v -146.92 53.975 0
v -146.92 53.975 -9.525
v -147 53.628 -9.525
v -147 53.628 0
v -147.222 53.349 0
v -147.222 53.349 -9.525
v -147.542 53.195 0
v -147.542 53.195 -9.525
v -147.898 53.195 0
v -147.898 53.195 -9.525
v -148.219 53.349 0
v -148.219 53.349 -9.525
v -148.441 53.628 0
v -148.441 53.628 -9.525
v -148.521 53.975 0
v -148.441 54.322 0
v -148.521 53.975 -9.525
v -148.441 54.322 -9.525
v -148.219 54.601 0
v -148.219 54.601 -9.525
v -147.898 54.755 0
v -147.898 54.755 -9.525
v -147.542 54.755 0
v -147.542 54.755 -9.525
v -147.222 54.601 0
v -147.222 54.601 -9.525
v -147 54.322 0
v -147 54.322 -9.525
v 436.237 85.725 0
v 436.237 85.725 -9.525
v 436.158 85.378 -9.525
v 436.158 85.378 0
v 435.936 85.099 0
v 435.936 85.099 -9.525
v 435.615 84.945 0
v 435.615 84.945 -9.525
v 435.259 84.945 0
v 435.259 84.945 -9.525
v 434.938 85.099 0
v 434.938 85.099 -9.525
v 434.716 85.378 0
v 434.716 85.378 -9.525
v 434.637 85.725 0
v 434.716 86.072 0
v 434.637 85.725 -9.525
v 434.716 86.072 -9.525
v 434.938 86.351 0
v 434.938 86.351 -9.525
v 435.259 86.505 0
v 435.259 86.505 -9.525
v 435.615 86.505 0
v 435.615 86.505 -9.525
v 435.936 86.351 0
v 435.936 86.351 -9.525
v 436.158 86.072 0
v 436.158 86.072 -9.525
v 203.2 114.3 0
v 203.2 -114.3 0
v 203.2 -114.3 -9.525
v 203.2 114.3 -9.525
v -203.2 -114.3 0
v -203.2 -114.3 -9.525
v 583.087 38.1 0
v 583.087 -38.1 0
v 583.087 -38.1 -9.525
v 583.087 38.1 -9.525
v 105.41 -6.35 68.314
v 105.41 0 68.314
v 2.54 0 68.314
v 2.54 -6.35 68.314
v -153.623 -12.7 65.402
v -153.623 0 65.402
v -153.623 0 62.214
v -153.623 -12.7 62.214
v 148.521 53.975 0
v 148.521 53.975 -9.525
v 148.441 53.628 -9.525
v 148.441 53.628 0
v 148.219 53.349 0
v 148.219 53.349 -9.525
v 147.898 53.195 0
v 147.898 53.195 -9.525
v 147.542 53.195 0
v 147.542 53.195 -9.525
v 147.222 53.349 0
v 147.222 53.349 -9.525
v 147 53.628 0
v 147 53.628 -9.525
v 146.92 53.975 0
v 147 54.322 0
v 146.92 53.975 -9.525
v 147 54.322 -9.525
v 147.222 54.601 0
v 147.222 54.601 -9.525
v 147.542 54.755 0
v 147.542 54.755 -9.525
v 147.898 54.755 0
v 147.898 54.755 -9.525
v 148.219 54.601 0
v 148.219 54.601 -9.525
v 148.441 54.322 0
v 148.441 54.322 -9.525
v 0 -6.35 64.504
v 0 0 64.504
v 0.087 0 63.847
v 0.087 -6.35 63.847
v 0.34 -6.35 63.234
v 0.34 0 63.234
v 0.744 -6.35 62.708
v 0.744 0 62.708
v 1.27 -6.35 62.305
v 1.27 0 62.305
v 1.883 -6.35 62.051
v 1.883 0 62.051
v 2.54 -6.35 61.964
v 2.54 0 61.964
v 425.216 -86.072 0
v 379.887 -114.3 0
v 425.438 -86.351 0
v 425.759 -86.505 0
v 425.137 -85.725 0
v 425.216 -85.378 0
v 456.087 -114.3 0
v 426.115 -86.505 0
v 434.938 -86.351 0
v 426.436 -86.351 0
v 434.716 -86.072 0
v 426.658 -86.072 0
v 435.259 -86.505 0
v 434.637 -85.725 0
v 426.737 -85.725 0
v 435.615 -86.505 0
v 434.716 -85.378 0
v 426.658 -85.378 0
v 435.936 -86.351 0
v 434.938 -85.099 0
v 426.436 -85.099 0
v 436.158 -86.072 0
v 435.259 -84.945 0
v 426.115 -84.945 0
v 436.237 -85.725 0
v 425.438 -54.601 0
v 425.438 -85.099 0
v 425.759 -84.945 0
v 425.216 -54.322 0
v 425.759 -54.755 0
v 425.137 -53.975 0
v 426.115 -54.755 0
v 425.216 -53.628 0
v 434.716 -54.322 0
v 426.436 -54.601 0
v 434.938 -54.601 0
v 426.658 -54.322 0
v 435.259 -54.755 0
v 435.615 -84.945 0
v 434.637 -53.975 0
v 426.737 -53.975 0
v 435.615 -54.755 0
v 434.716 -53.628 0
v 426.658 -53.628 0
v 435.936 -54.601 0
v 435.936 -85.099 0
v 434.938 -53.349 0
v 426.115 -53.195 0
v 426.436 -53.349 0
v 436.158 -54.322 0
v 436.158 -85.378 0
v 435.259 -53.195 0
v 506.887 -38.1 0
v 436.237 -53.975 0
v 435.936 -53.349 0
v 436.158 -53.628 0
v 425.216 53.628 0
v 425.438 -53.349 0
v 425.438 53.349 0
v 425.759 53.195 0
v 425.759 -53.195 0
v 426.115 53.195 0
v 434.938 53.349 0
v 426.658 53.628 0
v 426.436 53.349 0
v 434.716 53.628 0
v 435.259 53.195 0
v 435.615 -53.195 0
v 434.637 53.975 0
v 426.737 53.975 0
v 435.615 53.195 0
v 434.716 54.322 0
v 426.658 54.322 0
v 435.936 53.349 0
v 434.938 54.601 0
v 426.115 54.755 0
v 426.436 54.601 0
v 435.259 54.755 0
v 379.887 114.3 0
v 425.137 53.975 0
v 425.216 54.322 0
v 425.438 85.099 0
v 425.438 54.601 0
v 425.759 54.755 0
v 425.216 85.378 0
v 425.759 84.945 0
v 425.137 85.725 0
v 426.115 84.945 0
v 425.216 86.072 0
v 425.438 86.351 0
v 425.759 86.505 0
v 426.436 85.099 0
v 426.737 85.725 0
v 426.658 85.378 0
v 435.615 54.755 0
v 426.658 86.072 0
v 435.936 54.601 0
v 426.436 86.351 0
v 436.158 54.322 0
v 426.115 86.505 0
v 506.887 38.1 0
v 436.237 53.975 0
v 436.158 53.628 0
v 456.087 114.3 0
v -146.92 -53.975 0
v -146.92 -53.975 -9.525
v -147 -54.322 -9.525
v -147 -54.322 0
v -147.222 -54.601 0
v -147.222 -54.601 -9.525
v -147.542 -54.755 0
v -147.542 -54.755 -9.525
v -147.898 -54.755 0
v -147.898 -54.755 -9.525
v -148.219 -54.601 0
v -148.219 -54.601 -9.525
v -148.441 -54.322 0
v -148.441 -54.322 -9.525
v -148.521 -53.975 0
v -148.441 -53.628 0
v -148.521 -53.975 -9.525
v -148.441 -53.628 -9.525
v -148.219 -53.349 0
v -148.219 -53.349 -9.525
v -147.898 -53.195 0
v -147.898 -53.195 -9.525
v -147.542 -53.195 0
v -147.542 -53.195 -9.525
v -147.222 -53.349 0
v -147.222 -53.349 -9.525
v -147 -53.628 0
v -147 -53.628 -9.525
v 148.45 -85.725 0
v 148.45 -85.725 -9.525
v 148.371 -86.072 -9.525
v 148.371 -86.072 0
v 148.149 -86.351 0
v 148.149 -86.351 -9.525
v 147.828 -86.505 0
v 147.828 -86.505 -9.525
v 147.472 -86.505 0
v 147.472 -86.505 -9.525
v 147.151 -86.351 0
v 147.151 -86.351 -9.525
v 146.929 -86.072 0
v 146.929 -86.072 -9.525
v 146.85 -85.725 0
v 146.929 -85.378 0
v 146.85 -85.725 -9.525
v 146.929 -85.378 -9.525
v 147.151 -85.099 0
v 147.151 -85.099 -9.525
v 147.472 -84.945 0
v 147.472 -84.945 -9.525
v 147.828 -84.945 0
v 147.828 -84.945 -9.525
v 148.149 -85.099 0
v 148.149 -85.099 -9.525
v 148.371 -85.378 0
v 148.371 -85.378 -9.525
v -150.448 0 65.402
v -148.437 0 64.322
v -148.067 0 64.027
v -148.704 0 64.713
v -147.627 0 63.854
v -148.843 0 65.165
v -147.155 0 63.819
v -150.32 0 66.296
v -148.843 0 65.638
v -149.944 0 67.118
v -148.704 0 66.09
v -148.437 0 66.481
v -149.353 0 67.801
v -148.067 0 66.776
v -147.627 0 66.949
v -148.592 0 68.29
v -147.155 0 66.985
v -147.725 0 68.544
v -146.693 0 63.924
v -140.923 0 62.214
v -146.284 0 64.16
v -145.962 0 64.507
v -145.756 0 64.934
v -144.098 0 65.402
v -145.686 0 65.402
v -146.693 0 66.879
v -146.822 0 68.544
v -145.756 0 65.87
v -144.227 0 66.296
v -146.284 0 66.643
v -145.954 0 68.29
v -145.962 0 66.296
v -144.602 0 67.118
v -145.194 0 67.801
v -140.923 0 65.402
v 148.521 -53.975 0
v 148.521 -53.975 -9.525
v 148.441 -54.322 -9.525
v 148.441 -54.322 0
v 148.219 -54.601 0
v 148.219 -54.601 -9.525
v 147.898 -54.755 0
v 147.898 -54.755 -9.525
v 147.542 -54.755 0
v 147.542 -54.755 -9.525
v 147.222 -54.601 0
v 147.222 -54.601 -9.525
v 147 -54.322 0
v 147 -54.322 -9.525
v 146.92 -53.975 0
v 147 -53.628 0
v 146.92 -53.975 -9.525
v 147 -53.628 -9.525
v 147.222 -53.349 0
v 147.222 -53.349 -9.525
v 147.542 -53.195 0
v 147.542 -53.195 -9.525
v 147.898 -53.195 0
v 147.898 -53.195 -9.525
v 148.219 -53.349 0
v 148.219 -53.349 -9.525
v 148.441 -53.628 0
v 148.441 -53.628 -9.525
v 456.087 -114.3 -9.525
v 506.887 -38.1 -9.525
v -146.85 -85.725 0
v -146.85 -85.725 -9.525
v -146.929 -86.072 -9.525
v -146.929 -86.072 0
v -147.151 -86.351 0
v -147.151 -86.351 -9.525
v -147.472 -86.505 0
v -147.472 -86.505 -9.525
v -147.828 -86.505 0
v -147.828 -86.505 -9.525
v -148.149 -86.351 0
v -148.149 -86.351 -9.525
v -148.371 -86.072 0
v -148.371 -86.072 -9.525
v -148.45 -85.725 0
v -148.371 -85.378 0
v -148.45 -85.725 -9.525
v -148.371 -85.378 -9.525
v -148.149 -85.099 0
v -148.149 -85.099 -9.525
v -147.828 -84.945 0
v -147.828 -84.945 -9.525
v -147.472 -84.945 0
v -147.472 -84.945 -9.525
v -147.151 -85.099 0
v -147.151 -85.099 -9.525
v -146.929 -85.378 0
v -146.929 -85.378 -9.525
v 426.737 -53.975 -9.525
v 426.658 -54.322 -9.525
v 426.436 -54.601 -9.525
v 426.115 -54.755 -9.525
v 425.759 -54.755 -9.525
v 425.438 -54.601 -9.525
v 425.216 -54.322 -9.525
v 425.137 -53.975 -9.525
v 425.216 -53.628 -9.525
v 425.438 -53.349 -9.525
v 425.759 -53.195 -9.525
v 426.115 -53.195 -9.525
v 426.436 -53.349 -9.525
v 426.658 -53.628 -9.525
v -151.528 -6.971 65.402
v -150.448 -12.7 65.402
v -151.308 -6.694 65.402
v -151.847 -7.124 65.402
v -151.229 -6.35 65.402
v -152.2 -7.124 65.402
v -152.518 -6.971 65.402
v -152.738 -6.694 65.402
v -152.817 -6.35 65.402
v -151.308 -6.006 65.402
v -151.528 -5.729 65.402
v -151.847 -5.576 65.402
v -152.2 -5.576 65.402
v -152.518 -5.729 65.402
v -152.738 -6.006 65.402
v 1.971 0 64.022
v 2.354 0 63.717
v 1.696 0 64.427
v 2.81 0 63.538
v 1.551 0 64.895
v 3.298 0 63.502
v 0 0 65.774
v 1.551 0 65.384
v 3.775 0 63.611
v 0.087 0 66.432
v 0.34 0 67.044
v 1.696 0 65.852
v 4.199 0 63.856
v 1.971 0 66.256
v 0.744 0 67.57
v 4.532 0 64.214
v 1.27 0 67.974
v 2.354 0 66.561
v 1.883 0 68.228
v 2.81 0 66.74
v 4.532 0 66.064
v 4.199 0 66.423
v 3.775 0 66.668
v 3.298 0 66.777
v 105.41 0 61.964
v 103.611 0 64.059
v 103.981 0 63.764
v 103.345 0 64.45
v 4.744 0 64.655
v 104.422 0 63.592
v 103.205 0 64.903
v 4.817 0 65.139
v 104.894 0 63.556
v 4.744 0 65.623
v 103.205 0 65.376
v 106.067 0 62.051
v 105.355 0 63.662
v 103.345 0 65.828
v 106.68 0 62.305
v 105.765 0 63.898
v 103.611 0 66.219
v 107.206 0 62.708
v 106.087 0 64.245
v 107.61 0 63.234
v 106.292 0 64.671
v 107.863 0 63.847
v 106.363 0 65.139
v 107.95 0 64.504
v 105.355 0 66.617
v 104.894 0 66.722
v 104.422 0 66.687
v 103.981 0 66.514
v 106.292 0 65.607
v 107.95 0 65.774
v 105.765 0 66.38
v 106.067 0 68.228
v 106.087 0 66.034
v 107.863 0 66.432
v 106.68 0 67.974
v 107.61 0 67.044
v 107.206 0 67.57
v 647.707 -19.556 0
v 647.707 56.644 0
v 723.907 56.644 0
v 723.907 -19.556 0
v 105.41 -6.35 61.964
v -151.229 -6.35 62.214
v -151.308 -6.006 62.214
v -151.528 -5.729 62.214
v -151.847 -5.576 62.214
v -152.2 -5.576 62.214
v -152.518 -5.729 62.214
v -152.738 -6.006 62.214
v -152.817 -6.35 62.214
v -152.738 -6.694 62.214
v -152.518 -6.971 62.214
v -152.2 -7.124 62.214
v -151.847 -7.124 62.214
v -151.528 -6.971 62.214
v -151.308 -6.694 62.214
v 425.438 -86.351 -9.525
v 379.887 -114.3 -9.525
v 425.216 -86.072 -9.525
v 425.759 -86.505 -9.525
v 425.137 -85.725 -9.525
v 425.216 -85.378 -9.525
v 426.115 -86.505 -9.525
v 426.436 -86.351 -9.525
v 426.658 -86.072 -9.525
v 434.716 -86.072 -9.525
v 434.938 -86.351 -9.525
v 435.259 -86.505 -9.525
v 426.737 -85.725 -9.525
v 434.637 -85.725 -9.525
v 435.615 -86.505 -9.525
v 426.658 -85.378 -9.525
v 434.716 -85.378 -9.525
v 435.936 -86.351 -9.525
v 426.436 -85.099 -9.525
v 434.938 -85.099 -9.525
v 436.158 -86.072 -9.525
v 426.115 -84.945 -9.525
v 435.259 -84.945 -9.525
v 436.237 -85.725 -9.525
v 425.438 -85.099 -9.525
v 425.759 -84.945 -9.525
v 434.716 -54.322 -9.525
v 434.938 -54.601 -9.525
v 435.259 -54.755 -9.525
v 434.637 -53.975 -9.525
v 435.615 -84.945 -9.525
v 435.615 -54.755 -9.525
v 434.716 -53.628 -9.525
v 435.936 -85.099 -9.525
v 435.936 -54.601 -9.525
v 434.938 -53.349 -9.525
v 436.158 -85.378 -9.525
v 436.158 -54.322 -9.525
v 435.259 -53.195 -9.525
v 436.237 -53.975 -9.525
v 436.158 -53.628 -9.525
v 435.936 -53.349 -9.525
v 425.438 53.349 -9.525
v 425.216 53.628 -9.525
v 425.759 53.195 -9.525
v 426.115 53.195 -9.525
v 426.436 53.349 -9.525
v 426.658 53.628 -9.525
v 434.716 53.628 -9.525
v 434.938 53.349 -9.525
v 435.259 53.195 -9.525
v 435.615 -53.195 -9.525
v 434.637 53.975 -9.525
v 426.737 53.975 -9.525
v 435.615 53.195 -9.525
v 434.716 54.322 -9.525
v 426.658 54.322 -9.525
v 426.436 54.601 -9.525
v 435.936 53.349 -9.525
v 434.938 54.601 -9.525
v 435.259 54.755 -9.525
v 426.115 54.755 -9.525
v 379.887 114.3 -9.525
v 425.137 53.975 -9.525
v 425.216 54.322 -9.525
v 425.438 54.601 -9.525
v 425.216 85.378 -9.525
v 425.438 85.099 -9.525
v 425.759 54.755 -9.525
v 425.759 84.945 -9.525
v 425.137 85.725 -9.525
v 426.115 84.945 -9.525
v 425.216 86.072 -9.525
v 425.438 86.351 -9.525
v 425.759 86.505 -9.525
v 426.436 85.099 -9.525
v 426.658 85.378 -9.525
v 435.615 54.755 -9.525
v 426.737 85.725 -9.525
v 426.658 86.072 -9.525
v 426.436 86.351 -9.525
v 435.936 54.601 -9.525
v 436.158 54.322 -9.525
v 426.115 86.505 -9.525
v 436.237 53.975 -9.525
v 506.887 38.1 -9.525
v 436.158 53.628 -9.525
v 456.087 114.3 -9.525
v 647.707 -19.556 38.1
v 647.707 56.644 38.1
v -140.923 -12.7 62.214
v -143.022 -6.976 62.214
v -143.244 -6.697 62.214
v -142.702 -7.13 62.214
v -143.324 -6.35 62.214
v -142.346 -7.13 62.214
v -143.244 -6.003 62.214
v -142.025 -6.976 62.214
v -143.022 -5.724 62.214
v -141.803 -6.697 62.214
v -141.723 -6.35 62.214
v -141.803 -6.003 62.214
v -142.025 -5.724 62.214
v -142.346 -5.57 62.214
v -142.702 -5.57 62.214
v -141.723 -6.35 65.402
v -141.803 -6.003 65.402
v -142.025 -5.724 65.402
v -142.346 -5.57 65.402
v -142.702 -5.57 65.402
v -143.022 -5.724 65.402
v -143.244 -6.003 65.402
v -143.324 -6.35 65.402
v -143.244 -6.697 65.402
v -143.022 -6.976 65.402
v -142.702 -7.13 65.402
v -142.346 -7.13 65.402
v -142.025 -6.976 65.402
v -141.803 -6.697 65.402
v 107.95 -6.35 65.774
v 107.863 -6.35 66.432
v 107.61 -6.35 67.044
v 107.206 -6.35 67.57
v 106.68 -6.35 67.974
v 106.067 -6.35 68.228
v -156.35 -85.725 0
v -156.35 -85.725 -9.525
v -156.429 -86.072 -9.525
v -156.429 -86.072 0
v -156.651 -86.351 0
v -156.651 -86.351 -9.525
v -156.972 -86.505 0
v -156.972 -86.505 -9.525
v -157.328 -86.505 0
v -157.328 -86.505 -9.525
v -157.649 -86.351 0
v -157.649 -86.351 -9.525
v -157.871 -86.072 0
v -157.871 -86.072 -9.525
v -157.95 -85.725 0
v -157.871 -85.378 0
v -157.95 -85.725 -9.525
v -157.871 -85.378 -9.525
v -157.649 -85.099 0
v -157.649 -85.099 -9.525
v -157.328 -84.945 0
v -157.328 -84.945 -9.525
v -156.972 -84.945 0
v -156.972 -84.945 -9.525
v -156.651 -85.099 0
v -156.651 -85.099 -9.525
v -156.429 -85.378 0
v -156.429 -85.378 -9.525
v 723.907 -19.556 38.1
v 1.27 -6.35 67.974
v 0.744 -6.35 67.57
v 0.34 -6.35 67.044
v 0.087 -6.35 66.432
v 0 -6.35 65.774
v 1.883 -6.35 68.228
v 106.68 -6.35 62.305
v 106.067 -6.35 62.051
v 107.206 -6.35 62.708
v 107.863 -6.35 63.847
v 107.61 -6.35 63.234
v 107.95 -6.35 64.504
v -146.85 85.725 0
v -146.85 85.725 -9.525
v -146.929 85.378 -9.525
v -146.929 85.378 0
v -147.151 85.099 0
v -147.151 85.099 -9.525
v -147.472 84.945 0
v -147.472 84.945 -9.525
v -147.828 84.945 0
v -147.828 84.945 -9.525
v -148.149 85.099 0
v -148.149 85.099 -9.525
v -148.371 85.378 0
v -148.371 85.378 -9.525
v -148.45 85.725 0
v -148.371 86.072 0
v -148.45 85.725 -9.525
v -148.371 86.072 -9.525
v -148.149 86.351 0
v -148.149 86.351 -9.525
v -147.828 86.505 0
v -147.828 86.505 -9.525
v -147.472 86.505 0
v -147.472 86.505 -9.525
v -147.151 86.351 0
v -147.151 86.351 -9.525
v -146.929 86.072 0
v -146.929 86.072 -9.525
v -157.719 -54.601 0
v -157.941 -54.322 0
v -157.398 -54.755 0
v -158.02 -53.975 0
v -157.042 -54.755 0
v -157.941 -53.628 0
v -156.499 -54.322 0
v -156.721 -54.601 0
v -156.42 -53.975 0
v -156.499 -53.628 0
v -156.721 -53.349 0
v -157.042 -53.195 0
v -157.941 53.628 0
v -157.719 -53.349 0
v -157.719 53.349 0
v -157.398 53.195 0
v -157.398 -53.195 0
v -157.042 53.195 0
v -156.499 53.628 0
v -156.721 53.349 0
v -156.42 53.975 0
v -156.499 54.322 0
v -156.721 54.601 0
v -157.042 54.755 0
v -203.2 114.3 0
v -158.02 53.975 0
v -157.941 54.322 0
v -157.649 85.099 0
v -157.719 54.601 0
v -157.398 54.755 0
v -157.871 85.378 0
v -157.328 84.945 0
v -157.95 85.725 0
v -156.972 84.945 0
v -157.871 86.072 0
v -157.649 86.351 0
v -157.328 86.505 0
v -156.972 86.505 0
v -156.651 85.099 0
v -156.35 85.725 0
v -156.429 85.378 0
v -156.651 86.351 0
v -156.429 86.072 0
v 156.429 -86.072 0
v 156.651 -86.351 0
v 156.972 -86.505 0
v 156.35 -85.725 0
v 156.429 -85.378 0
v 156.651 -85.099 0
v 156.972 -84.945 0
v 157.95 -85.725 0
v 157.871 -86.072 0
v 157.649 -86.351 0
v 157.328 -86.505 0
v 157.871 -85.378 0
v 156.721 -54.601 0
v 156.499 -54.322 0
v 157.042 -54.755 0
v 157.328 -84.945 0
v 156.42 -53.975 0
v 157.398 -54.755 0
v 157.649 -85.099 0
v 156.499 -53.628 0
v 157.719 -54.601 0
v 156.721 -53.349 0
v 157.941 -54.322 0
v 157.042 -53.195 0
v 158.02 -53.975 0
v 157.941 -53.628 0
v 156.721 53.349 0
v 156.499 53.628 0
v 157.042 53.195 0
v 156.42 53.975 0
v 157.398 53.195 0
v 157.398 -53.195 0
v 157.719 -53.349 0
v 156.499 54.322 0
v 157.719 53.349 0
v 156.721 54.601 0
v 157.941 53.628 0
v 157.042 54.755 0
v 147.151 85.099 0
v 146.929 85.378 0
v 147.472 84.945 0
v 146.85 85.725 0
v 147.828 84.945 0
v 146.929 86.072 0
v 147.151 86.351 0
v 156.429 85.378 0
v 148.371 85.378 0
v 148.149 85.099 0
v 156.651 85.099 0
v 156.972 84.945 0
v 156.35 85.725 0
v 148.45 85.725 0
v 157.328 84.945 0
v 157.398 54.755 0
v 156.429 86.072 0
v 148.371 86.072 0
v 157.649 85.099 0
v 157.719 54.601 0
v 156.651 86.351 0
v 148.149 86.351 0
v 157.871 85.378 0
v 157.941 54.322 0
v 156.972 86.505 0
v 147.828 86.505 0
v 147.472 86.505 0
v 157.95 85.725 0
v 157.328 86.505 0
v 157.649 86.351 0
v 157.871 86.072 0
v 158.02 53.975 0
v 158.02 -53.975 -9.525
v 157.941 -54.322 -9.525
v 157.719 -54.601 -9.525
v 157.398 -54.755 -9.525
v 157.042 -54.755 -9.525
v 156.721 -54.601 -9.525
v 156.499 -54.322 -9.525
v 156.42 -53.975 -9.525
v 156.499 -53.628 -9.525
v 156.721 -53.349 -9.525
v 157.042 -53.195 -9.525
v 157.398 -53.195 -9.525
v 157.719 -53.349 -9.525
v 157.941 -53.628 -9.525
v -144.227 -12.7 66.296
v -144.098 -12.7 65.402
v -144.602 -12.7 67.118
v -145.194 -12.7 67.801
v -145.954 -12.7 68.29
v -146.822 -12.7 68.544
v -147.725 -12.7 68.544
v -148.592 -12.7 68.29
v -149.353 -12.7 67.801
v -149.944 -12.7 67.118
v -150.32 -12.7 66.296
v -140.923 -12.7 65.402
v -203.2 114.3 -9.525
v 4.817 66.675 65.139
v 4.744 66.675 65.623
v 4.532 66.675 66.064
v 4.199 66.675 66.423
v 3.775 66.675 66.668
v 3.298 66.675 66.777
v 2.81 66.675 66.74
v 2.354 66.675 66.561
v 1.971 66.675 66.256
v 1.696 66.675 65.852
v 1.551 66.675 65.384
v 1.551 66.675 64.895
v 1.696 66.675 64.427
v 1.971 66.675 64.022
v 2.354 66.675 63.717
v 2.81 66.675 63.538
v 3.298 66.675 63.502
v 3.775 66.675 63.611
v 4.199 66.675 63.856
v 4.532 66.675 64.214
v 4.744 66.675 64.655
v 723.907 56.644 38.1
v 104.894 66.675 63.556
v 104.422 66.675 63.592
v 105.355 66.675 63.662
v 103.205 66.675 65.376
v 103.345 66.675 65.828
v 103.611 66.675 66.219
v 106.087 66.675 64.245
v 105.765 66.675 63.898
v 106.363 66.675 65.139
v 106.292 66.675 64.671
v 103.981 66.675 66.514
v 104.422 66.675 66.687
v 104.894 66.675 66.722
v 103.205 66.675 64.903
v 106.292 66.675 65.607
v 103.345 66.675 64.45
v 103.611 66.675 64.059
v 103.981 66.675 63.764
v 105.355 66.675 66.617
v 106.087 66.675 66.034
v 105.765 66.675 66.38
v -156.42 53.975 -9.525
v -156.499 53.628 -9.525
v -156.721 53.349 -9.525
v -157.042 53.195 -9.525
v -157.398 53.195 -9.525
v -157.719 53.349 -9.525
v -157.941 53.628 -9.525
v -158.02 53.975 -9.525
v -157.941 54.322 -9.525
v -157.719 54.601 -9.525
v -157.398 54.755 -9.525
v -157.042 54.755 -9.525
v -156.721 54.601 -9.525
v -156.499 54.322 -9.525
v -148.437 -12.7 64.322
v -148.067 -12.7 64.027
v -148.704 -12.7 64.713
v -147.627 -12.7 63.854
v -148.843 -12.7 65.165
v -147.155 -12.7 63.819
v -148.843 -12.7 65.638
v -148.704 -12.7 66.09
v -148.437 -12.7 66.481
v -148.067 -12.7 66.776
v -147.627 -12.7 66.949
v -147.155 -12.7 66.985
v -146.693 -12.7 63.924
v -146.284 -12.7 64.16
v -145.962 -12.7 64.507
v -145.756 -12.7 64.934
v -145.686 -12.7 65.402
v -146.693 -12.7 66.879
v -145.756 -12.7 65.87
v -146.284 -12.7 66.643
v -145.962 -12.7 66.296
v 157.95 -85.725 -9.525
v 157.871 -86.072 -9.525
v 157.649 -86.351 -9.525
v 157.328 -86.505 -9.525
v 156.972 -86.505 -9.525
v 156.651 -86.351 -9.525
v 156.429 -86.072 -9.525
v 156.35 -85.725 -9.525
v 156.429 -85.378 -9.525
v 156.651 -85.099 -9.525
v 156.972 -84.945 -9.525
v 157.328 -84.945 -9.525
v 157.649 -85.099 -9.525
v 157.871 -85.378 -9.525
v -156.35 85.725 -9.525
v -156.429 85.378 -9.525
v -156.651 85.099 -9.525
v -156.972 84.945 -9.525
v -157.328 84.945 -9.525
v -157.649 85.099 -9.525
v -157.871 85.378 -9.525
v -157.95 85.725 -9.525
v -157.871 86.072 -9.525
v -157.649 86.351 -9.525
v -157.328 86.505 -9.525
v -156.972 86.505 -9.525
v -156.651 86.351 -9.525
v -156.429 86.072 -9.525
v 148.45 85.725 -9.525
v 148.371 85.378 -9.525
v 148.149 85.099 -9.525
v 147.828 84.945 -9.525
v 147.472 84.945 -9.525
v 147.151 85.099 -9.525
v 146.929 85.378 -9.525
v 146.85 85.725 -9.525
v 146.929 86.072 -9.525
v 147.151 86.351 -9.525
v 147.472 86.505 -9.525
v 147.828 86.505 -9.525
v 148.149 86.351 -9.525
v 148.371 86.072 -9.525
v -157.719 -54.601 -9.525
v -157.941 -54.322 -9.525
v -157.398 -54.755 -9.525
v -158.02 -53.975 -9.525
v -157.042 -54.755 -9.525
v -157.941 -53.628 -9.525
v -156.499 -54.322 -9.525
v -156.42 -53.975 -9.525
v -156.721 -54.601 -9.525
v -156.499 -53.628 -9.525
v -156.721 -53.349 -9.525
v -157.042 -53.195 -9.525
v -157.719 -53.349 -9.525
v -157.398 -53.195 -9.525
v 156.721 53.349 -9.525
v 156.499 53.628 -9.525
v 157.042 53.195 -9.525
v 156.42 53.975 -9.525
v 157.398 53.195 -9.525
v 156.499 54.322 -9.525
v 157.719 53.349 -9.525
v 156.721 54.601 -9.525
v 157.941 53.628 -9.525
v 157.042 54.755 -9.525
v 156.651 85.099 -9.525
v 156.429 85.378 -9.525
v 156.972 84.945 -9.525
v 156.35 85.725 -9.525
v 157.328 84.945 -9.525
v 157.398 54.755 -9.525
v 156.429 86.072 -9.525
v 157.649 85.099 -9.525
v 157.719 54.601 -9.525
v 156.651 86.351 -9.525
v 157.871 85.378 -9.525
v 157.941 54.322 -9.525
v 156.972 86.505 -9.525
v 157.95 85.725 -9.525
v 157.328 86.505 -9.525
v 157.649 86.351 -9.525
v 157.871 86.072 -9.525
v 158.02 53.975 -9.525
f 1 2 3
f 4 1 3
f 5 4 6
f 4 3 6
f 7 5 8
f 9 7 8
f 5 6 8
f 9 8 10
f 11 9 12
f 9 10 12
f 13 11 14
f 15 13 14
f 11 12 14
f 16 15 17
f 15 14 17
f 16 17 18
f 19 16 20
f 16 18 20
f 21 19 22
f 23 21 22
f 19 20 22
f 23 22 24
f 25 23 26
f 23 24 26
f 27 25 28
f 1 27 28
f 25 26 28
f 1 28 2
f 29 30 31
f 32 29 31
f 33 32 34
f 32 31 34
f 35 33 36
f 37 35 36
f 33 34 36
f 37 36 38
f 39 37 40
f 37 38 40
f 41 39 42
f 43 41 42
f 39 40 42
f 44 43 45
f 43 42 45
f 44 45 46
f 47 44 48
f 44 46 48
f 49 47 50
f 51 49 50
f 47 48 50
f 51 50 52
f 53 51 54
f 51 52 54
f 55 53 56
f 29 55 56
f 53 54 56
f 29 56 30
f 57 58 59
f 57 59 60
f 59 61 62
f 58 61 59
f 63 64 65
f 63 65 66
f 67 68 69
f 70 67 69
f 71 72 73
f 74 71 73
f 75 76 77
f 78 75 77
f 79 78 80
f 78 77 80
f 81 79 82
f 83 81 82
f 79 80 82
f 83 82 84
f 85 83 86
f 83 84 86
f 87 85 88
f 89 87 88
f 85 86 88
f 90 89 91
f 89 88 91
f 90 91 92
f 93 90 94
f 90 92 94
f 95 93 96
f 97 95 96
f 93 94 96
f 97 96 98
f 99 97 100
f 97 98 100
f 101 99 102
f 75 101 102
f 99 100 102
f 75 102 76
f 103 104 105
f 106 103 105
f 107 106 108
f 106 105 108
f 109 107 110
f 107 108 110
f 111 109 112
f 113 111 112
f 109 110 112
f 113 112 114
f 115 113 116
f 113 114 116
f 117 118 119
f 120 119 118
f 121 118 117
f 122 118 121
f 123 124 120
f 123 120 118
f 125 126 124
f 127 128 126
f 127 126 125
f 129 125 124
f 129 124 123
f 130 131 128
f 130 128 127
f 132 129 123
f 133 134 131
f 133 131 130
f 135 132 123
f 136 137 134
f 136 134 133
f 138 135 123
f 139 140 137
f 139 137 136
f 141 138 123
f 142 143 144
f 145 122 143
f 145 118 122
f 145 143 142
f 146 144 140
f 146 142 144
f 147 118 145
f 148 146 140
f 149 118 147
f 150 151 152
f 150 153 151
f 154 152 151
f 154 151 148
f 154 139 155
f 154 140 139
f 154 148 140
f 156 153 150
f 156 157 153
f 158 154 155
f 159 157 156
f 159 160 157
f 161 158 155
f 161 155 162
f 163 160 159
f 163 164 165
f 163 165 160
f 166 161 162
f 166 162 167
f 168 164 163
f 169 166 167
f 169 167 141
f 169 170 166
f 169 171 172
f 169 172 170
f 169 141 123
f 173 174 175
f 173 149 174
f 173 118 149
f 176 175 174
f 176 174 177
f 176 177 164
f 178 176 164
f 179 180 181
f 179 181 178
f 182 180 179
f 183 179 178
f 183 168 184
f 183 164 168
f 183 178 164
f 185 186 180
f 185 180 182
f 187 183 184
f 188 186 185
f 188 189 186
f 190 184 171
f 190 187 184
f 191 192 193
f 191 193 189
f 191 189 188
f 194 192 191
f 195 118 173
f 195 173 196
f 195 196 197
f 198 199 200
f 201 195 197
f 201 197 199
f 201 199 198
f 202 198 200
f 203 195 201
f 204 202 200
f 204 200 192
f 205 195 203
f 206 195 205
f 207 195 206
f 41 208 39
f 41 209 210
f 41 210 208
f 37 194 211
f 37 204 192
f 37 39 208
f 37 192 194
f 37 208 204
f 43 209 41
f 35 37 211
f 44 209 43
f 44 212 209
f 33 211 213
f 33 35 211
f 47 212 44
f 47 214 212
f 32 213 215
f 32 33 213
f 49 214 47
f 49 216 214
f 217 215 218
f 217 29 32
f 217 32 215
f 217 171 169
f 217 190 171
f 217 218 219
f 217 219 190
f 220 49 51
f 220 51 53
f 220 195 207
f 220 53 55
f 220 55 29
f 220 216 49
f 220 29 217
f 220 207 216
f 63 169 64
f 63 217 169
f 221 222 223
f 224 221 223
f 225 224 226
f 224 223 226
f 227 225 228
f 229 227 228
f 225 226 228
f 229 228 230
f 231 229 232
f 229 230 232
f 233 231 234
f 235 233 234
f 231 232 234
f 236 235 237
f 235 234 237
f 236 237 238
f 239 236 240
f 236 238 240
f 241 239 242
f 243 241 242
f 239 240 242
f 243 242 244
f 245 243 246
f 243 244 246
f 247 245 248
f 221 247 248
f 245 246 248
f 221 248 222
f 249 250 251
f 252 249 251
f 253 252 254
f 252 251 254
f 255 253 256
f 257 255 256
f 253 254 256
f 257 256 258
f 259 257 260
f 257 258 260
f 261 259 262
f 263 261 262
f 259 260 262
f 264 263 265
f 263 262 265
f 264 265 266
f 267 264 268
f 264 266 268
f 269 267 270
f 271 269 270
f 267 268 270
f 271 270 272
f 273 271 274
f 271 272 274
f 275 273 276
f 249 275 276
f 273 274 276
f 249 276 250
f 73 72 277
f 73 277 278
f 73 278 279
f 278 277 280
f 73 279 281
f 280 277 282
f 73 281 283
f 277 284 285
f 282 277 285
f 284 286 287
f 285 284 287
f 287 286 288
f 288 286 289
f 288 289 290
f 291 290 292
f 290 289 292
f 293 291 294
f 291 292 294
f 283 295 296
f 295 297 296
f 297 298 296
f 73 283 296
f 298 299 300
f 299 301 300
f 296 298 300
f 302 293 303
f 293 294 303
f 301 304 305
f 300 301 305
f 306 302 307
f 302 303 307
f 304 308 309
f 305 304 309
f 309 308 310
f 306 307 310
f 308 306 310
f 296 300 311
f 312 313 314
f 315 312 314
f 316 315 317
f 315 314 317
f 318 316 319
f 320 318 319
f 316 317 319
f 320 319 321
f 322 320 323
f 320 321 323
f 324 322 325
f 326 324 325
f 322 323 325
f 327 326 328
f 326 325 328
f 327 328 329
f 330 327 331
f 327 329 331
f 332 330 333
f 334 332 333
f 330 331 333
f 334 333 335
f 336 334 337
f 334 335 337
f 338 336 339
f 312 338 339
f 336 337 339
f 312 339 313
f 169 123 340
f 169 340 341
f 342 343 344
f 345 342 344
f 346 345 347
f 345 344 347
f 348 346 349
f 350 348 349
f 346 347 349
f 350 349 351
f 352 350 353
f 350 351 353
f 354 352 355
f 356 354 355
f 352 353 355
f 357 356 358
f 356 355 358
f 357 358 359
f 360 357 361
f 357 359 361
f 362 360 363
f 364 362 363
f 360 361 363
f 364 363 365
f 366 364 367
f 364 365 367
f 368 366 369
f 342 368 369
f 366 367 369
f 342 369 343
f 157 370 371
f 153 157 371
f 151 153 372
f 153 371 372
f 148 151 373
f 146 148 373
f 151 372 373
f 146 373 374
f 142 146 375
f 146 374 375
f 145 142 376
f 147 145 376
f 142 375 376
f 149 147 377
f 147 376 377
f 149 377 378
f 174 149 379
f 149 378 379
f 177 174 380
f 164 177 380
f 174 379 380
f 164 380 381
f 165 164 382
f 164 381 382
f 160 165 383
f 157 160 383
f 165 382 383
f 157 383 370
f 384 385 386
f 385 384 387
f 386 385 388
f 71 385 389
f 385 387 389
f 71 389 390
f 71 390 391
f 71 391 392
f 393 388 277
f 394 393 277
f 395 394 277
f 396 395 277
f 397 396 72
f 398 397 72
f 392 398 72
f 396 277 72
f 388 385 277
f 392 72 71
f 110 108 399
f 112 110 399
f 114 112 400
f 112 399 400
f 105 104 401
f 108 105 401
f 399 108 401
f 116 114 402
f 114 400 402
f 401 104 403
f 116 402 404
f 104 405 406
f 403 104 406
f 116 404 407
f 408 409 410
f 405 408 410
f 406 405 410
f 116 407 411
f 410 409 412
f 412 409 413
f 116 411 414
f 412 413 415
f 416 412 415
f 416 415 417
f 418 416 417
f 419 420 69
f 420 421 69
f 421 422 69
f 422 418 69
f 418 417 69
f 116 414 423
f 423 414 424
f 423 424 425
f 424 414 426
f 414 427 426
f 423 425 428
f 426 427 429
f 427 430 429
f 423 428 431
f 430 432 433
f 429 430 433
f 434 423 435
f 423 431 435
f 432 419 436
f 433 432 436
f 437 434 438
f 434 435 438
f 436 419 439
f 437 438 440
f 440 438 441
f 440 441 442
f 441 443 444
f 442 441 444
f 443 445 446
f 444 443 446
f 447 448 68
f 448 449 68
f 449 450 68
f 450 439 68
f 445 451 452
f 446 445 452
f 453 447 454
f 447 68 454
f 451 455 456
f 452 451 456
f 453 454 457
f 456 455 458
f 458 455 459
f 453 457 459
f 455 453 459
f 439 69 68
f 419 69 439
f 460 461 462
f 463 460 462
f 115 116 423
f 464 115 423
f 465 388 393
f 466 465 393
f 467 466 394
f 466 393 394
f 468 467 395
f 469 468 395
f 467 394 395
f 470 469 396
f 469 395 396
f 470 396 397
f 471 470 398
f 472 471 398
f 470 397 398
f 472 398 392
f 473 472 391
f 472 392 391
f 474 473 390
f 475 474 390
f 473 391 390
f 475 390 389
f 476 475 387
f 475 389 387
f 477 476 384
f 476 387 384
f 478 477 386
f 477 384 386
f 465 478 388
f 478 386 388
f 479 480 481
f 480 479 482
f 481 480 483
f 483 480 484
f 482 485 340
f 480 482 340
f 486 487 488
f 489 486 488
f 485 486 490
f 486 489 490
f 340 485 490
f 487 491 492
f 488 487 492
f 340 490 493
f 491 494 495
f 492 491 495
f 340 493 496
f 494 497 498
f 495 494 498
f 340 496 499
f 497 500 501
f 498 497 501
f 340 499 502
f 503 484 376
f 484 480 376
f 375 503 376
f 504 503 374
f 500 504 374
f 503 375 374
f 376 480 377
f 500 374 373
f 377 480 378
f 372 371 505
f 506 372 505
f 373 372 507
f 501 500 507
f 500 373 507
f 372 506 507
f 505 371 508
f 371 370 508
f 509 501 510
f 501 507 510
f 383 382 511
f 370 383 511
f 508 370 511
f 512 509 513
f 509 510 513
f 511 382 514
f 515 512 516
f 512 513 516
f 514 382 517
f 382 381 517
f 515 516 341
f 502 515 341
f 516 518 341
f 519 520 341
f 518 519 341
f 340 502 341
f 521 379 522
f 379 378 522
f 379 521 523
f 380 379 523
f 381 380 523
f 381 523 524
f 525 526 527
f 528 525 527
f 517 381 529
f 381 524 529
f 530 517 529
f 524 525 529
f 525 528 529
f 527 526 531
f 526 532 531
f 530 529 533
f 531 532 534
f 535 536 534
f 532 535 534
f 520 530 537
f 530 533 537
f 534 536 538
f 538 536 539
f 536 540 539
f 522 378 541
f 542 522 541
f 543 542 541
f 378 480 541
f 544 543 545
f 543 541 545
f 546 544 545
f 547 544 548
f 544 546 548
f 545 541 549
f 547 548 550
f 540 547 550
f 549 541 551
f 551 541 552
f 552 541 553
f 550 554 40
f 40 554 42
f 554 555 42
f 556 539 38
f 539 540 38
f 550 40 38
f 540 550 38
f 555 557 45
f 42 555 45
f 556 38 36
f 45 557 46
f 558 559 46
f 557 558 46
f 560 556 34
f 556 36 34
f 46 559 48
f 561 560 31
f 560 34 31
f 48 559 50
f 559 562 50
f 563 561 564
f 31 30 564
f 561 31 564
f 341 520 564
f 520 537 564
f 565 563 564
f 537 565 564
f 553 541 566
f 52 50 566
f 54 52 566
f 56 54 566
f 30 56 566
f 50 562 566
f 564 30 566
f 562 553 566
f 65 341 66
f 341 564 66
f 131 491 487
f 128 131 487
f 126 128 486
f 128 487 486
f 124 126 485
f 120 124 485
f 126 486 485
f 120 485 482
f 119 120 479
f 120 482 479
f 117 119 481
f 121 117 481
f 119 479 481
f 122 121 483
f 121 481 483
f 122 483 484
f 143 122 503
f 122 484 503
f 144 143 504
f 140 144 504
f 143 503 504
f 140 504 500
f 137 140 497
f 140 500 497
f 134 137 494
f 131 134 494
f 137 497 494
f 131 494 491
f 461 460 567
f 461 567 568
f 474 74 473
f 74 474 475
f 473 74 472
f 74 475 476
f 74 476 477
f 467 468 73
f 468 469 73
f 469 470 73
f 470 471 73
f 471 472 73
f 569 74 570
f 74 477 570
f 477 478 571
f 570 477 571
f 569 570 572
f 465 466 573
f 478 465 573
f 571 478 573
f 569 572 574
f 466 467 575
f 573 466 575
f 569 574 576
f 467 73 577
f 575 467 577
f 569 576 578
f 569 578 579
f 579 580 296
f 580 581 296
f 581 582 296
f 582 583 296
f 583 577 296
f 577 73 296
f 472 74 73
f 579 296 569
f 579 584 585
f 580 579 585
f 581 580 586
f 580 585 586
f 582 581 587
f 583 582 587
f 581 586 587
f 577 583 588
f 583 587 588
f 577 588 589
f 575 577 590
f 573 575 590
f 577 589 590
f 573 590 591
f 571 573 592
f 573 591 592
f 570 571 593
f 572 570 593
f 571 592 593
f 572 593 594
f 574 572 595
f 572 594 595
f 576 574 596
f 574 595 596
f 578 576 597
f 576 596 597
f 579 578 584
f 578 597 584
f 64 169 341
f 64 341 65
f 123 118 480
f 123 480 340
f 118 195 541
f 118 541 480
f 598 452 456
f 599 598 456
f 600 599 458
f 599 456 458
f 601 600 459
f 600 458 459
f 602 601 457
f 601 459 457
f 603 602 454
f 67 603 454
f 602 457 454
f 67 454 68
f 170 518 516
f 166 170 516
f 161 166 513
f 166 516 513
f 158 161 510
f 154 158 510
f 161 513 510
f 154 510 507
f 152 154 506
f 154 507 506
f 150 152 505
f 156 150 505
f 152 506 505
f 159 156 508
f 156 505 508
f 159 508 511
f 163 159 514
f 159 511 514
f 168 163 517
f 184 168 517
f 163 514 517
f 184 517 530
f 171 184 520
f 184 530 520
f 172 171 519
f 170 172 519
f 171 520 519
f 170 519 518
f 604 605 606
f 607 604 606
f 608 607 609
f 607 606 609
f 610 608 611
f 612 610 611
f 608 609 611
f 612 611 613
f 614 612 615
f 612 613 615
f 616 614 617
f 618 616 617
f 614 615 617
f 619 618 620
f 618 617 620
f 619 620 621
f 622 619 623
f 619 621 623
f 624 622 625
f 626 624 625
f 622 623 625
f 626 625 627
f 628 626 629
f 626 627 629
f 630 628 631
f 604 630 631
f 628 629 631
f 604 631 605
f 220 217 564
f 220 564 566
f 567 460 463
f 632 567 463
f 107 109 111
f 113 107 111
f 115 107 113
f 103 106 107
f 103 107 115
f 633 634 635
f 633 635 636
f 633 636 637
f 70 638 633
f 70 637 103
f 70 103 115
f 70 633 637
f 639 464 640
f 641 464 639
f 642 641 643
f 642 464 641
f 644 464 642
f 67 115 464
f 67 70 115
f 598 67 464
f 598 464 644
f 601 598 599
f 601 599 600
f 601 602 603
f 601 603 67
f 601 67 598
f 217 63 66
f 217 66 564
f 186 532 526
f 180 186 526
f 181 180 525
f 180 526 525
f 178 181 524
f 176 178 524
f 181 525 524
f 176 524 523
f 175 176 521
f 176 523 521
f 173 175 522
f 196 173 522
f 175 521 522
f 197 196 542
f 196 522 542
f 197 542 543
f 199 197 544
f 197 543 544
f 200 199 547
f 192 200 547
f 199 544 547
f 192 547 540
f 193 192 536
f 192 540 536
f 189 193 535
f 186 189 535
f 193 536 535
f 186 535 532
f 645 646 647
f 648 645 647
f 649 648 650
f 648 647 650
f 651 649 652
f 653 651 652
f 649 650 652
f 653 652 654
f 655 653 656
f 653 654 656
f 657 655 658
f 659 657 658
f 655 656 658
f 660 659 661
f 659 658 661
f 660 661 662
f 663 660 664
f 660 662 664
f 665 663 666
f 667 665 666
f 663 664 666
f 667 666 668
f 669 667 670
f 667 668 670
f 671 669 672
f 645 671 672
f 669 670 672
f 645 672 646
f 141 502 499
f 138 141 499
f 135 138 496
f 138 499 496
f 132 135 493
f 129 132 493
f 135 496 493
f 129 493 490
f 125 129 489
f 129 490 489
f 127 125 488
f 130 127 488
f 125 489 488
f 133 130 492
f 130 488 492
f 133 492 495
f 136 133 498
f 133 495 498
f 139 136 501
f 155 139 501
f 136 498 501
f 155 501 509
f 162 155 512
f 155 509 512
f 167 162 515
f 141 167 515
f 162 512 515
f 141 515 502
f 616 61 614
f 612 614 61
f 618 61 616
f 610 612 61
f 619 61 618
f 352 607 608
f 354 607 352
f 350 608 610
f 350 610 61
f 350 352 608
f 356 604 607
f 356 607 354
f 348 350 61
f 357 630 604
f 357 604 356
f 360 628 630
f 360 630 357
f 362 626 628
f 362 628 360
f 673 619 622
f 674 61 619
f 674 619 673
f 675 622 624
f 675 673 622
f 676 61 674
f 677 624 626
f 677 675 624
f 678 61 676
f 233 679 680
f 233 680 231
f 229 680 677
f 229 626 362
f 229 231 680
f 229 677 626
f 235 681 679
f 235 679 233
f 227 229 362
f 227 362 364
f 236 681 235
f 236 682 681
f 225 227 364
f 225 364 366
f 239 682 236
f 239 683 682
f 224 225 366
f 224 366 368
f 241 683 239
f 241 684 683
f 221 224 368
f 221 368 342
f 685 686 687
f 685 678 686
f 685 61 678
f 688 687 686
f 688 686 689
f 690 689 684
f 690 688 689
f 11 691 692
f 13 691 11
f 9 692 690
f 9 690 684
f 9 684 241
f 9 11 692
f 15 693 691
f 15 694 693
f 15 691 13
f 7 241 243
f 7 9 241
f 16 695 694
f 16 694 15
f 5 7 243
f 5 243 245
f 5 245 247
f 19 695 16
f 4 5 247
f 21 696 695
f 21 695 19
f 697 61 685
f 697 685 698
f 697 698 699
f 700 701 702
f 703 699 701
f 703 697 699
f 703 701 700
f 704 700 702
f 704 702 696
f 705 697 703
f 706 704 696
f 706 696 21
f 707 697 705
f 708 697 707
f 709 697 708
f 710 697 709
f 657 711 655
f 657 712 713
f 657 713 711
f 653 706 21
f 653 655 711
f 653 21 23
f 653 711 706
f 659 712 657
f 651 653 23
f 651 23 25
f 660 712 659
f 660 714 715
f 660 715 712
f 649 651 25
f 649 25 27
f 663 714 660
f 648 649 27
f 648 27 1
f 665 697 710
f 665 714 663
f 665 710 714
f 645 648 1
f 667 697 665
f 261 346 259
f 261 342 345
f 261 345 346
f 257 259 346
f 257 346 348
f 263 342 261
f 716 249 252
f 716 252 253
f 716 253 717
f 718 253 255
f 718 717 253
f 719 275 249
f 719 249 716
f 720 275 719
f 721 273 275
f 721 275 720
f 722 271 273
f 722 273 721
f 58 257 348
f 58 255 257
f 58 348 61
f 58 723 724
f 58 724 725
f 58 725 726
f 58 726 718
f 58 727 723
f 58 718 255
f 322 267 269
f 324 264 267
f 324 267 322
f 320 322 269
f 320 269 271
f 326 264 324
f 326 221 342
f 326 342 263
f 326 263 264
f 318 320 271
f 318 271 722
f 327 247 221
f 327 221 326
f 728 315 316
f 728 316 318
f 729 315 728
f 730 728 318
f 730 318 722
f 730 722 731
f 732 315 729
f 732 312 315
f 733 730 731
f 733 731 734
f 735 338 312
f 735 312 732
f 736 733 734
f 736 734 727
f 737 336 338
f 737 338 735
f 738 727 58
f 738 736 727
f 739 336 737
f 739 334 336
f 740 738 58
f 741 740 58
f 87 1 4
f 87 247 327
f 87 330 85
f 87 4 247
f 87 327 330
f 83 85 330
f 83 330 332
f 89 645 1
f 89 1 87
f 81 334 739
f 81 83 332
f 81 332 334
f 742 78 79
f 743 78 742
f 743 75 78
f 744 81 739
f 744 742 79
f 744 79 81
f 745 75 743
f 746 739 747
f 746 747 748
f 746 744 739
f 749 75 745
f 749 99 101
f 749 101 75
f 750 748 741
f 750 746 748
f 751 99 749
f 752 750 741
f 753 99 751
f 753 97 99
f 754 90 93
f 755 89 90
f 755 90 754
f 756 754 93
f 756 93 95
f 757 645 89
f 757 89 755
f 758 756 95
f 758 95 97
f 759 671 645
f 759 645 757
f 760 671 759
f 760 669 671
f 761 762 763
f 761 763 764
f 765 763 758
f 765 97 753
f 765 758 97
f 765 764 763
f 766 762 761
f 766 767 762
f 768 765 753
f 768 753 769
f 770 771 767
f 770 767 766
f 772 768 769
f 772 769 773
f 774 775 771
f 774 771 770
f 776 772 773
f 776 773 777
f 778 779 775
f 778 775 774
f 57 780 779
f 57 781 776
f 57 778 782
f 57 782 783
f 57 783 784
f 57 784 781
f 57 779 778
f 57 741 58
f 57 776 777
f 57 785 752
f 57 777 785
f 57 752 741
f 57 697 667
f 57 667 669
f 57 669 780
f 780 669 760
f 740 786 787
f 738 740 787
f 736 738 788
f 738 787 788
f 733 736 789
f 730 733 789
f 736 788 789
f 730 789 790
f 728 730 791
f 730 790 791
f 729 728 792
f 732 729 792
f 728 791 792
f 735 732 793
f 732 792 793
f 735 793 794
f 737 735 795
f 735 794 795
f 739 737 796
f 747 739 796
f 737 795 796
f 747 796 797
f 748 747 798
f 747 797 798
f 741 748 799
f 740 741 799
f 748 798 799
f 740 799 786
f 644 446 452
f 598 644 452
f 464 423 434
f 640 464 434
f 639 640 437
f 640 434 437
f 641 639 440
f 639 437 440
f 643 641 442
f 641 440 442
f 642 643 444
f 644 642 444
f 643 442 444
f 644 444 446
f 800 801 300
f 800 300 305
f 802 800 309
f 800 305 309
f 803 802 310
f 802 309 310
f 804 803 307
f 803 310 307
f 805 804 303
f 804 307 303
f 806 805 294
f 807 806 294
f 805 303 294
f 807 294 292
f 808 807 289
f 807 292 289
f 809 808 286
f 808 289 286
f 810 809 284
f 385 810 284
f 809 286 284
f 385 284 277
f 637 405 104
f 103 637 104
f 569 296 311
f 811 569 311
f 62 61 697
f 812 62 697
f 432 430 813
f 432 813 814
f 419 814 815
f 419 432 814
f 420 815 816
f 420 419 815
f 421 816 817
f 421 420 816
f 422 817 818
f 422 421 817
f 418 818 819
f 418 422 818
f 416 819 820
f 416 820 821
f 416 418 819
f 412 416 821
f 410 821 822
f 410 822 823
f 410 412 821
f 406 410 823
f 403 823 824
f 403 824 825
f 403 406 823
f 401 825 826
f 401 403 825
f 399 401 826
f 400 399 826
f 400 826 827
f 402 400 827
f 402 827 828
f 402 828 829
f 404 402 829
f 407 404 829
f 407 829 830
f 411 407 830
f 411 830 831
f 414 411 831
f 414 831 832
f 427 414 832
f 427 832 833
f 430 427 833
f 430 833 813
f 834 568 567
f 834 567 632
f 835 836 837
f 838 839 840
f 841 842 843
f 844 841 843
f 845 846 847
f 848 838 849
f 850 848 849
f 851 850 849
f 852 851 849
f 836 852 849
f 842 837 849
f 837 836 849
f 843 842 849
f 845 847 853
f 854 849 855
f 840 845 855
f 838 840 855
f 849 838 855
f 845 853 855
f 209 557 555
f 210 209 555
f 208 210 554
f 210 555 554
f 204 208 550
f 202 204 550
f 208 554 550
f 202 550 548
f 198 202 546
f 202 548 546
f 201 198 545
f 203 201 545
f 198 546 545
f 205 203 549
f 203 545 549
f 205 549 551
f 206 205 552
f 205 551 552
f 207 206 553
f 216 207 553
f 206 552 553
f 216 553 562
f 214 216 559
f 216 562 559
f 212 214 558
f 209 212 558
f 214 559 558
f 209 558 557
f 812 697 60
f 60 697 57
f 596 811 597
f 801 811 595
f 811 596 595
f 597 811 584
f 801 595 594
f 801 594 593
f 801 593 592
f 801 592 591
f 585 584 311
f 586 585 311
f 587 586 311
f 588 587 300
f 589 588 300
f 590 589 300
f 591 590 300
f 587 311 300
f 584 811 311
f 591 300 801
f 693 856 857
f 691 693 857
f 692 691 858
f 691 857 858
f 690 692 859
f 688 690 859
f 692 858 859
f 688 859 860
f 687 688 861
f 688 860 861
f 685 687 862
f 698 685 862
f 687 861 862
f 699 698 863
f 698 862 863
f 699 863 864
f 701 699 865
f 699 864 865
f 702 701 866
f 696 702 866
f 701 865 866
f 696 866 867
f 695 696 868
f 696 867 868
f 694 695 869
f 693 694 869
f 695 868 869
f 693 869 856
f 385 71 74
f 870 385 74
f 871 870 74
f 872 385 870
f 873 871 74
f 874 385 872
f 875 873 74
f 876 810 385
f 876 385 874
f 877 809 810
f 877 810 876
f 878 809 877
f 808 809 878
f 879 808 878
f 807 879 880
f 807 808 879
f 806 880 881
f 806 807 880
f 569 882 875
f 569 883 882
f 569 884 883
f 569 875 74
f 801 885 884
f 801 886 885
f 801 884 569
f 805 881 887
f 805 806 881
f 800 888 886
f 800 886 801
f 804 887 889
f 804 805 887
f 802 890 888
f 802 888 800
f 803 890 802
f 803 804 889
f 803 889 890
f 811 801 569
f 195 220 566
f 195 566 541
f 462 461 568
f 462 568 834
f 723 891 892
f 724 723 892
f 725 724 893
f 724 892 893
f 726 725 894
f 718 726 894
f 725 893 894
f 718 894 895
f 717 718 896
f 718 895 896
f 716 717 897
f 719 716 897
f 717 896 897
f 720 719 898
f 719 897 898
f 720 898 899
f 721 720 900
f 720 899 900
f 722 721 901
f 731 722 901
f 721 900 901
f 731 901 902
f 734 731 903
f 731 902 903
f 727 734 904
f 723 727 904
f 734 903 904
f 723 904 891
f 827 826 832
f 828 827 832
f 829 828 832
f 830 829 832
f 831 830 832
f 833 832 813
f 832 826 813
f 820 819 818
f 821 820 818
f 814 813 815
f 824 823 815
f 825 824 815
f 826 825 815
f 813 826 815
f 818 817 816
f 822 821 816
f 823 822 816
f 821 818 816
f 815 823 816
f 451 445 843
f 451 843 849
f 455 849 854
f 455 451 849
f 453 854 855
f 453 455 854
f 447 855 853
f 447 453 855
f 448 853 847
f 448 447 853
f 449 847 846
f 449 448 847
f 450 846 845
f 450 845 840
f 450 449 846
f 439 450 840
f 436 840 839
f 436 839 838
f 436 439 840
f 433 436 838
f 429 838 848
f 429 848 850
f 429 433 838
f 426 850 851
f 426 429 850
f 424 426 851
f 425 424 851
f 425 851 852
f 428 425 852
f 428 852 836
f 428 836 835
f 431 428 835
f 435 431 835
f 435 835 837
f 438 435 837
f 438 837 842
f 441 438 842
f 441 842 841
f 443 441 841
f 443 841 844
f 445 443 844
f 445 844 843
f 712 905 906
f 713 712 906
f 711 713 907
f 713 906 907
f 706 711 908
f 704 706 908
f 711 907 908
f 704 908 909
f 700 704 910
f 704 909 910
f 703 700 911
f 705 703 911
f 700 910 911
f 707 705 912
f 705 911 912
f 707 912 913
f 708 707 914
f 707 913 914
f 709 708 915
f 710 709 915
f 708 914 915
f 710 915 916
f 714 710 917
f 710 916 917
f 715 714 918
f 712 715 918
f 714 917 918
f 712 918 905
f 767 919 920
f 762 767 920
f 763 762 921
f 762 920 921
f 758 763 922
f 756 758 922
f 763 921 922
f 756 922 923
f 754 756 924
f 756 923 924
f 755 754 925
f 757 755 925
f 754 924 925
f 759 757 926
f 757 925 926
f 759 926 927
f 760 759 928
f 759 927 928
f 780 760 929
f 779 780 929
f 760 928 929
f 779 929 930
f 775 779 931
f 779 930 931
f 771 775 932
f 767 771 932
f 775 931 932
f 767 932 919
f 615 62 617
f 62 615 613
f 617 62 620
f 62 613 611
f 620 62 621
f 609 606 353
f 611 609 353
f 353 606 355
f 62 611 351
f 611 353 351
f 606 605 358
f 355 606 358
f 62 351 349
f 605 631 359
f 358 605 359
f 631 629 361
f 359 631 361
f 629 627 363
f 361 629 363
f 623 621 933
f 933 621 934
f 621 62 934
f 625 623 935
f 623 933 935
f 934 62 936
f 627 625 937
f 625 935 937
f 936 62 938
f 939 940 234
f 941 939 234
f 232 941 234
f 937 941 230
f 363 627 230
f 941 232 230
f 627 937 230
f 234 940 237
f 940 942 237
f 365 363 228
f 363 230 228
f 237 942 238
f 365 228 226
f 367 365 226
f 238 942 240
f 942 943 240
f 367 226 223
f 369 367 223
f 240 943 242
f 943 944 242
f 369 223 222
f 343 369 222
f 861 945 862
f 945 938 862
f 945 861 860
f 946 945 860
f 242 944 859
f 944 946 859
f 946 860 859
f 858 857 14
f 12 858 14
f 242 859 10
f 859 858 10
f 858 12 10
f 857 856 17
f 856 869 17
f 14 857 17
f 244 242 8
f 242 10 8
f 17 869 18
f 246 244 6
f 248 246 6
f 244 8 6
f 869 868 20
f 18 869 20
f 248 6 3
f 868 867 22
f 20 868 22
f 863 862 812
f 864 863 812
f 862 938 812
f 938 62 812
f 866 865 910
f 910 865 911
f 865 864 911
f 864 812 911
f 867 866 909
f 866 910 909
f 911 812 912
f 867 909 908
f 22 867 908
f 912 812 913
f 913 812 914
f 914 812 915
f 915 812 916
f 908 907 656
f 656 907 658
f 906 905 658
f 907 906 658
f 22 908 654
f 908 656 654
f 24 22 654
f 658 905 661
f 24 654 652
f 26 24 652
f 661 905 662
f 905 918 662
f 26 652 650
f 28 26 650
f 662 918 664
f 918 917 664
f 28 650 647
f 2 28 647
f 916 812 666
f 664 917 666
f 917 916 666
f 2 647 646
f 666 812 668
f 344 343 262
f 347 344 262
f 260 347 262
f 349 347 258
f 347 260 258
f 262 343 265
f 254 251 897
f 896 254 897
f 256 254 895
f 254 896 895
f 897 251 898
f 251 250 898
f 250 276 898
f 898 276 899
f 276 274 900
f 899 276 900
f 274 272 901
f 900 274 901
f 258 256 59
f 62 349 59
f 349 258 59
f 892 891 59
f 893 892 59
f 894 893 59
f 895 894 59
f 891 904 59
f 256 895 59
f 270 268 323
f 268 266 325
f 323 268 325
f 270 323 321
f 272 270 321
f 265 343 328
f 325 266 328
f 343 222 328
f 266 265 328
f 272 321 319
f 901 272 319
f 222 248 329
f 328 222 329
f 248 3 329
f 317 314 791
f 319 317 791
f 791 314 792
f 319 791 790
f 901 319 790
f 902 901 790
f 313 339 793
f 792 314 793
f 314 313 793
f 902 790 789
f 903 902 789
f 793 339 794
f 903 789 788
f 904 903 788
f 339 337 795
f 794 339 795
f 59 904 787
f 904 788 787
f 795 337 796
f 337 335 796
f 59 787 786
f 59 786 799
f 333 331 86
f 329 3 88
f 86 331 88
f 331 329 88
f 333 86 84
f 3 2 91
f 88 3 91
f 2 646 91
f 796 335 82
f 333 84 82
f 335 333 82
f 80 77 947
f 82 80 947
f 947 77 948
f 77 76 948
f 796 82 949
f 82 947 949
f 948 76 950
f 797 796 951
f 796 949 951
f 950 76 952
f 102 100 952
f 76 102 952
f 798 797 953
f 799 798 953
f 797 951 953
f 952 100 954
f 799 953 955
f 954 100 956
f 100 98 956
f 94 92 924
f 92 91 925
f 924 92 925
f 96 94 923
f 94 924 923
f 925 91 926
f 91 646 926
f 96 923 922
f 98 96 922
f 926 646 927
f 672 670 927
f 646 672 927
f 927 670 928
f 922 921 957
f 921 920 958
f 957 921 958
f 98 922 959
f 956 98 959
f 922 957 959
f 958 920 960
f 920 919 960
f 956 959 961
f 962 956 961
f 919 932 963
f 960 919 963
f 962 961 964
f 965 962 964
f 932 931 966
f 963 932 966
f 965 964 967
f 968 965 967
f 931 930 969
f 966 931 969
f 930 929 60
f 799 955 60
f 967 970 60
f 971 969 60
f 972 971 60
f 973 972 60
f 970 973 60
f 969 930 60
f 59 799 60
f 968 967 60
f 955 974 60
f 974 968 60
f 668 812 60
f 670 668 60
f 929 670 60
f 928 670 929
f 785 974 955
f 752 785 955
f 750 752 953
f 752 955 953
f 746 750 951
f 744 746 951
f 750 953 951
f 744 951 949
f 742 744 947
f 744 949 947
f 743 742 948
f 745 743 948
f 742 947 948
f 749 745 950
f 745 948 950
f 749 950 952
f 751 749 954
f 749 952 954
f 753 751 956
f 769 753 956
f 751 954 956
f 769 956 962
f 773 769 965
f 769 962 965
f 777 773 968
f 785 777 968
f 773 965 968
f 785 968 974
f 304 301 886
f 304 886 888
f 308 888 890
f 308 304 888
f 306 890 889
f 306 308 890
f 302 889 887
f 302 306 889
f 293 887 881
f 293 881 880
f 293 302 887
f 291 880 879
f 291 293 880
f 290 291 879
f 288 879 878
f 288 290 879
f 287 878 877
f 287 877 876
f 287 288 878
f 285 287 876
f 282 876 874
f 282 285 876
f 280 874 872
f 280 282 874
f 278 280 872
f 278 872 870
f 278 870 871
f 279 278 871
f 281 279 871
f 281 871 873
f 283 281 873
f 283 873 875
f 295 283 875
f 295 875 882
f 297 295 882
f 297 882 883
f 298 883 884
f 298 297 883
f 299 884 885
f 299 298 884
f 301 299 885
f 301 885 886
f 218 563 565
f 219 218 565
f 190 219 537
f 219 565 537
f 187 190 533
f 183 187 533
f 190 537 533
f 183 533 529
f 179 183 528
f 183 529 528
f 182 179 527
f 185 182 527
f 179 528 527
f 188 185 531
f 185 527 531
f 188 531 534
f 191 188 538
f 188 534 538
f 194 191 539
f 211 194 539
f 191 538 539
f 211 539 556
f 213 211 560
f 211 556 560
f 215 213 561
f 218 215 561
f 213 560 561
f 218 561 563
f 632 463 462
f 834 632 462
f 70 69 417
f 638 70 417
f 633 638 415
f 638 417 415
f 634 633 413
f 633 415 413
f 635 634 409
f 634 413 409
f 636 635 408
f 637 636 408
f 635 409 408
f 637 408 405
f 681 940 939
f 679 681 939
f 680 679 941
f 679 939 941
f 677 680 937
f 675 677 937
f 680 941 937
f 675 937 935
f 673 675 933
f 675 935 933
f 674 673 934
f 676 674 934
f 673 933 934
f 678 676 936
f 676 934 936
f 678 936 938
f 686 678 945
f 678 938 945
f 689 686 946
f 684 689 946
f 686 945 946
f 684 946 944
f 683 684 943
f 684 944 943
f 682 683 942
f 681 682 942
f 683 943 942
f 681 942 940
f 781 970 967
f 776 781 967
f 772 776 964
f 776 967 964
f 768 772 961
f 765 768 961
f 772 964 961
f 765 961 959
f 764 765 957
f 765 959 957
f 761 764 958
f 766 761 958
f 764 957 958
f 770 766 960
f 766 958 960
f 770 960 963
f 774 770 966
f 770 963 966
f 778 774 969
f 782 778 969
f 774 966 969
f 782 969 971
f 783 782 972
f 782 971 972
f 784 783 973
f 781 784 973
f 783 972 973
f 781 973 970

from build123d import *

# Parameters (mm, degrees)
F0_W      = 406.4
F0_H      = 228.6
F1_DEPTH  = 9.525
F3_DEPTH  = 9.525
F4_R      = 1.5875
F5_DEPTH  = 6.35
F6_R      = 1.6419743879
F6_R_2    = 1.5875
F7_DEPTH  = 73.025
F8_R      = 1.5875
F9_DEPTH  = 12.7
F10_R     = 0.79375
F10_R_2   = 0.8001
F11_DEPTH = 74.9276538282
F12_R     = 0.8001
F13_DEPTH = 78.1026538282
F14_R     = 0.8001
F15_DEPTH = 78.1026538282
F16_W     = 76.2
F16_H     = 76.2
F17_DEPTH = 38.1


with BuildPart() as f1:
    # F0 (on Top) → F1 (new body)
    with BuildSketch(Plane.XY):
        Rectangle(F0_W, F0_H)
    extrude(amount=-F1_DEPTH)

    # F12 (on face) → F13 (cut, through all)
    with BuildSketch(Plane(origin=(0, 0, -9.525), x_dir=(1, 0, 0), z_dir=(0, 0, -1))):
        with Locations((157.1498, 85.725)):
            Circle(F12_R)
        with Locations((147.6502, 85.725)):
            Circle(F12_R)
        with Locations((-147.6502, 85.725)):
            Circle(F12_R)
        with Locations((-157.1498, 85.725)):
            Circle(F12_R)
        with Locations((147.6502, -85.725)):
            Circle(F12_R)
        with Locations((157.1498, -85.725)):
            Circle(F12_R)
        with Locations((-147.6502, -85.725)):
            Circle(F12_R)
        with Locations((-157.1498, -85.725)):
            Circle(F12_R)
        with Locations((147.7204012539, 53.975)):
            Circle(F12_R)
        with Locations((157.2200012539, 53.975)):
            Circle(F12_R)
        with Locations((147.7204012539, -53.975)):
            Circle(F12_R)
        with Locations((157.2200012539, -53.975)):
            Circle(F12_R)
        with Locations((-147.7204012539, -53.975)):
            Circle(F12_R)
        with Locations((-157.2200012539, -53.975)):
            Circle(F12_R)
        with Locations((-147.7204012539, 53.975)):
            Circle(F12_R)
        with Locations((-157.2200012539, 53.975)):
            Circle(F12_R)
    extrude(amount=-F13_DEPTH, mode=Mode.SUBTRACT)


with BuildPart() as f3:
    # F2 (on Top) → F3 (new body)
    with BuildSketch(Plane.XY):
        Polygon((379.8870294891, 114.3), (379.8870294891, -114.3), (456.0870294891, -114.3), (506.8870294891, -38.1), (583.0870294891, -38.1), (583.0870294891, 38.1), (506.8870294891, 38.1), (456.0870294891, 114.3), align=None)
    extrude(amount=-F3_DEPTH)

    # F14 (on face) → F15 (cut, through all)
    with BuildSketch(Plane(origin=(0, 0, -9.525), x_dir=(1, 0, 0), z_dir=(0, 0, -1))):
        with Locations((425.9372294891, 85.725)):
            Circle(F14_R)
        with Locations((435.4368294891, 85.725)):
            Circle(F14_R)
        with Locations((425.9372294891, -85.725)):
            Circle(F14_R)
        with Locations((435.4368294891, -85.725)):
            Circle(F14_R)
        with Locations((425.9372294891, 53.975)):
            Circle(F14_R)
        with Locations((435.4368294891, 53.975)):
            Circle(F14_R)
        with Locations((435.4368294891, -53.975)):
            Circle(F14_R)
        with Locations((425.9372294891, -53.975)):
            Circle(F14_R)
    extrude(amount=-F15_DEPTH, mode=Mode.SUBTRACT)


with BuildPart() as f5:
    # F4 (on Front) → F5 (new body)
    with BuildSketch(Plane.XZ):
        with BuildLine():
            Line((105.41, 68.3142677468), (2.54, 68.3142677468))
            ThreePointArc((2.54, 68.3142677468), (0.7439487758, 67.570318971), (0, 65.7742677468))
            Line((0, 65.7742677468), (0, 64.5042677468))
            ThreePointArc((0, 64.5042677468), (0.7439487758, 62.7082165226), (2.54, 61.9642677468))
            Line((2.54, 61.9642677468), (105.41, 61.9642677468))
            ThreePointArc((105.41, 61.9642677468), (107.2060512242, 62.7082165226), (107.95, 64.5042677468))
            Line((107.95, 64.5042677468), (107.95, 65.7742677468))
            ThreePointArc((107.95, 65.7742677468), (107.2060512242, 67.570318971), (105.41, 68.3142677468))
        make_face()
        with Locations((3.175, 65.1392677468)):
            Circle(F4_R, mode=Mode.SUBTRACT)
        with Locations((104.775, 65.1392677468)):
            Circle(F4_R, mode=Mode.SUBTRACT)
    extrude(amount=F5_DEPTH)

    # F6 (on face) → F7 (join)
    with BuildSketch(Plane.XZ.offset(6.35)):
        with Locations((3.175, 65.1392677468)):
            Circle(F6_R)
        with Locations((104.775, 65.1392677468)):
            Circle(F6_R_2)
    extrude(amount=-F7_DEPTH)


with BuildPart() as f9:
    # F8 (on Front) → F9 (new body)
    with BuildSketch(Plane.XZ):
        with BuildLine():
            Line((-140.9233872175, 65.4016538282), (-144.0983872175, 65.4016538282))
            ThreePointArc((-144.0983872175, 65.4016538282), (-147.2733872175, 68.5766538282), (-150.4483872175, 65.4016538282))
            Line((-150.4483872175, 65.4016538282), (-153.6233872175, 65.4016538282))
            Line((-153.6233872175, 65.4016538282), (-153.6233872175, 62.2139538282))
            Line((-153.6233872175, 62.2139538282), (-140.9233872175, 62.2139538282))
            Line((-140.9233872175, 62.2139538282), (-140.9233872175, 65.4016538282))
        make_face()
        with Locations((-147.2733872175, 65.4016538282)):
            Circle(F8_R, mode=Mode.SUBTRACT)
    extrude(amount=F9_DEPTH)

    # F10 (on face) → F11 (cut, through all)
    with BuildSketch(Plane.XY.offset(65.4016538282)):
        with Locations((-152.0231872175, -6.35)):
            Circle(F10_R)
        with Locations((-142.5235872175, -6.35)):
            Circle(F10_R_2)
    extrude(amount=-F11_DEPTH, mode=Mode.SUBTRACT)


with BuildPart() as f17:
    # F16 (on Top) → F17 (new body)
    with BuildSketch(Plane.XY):
        with Locations((685.8072578907, 18.5436561204)):
            Rectangle(F16_W, F16_H)
    extrude(amount=F17_DEPTH)


solid = Compound([f1.part, f3.part, f5.part, f9.part, f17.part])
